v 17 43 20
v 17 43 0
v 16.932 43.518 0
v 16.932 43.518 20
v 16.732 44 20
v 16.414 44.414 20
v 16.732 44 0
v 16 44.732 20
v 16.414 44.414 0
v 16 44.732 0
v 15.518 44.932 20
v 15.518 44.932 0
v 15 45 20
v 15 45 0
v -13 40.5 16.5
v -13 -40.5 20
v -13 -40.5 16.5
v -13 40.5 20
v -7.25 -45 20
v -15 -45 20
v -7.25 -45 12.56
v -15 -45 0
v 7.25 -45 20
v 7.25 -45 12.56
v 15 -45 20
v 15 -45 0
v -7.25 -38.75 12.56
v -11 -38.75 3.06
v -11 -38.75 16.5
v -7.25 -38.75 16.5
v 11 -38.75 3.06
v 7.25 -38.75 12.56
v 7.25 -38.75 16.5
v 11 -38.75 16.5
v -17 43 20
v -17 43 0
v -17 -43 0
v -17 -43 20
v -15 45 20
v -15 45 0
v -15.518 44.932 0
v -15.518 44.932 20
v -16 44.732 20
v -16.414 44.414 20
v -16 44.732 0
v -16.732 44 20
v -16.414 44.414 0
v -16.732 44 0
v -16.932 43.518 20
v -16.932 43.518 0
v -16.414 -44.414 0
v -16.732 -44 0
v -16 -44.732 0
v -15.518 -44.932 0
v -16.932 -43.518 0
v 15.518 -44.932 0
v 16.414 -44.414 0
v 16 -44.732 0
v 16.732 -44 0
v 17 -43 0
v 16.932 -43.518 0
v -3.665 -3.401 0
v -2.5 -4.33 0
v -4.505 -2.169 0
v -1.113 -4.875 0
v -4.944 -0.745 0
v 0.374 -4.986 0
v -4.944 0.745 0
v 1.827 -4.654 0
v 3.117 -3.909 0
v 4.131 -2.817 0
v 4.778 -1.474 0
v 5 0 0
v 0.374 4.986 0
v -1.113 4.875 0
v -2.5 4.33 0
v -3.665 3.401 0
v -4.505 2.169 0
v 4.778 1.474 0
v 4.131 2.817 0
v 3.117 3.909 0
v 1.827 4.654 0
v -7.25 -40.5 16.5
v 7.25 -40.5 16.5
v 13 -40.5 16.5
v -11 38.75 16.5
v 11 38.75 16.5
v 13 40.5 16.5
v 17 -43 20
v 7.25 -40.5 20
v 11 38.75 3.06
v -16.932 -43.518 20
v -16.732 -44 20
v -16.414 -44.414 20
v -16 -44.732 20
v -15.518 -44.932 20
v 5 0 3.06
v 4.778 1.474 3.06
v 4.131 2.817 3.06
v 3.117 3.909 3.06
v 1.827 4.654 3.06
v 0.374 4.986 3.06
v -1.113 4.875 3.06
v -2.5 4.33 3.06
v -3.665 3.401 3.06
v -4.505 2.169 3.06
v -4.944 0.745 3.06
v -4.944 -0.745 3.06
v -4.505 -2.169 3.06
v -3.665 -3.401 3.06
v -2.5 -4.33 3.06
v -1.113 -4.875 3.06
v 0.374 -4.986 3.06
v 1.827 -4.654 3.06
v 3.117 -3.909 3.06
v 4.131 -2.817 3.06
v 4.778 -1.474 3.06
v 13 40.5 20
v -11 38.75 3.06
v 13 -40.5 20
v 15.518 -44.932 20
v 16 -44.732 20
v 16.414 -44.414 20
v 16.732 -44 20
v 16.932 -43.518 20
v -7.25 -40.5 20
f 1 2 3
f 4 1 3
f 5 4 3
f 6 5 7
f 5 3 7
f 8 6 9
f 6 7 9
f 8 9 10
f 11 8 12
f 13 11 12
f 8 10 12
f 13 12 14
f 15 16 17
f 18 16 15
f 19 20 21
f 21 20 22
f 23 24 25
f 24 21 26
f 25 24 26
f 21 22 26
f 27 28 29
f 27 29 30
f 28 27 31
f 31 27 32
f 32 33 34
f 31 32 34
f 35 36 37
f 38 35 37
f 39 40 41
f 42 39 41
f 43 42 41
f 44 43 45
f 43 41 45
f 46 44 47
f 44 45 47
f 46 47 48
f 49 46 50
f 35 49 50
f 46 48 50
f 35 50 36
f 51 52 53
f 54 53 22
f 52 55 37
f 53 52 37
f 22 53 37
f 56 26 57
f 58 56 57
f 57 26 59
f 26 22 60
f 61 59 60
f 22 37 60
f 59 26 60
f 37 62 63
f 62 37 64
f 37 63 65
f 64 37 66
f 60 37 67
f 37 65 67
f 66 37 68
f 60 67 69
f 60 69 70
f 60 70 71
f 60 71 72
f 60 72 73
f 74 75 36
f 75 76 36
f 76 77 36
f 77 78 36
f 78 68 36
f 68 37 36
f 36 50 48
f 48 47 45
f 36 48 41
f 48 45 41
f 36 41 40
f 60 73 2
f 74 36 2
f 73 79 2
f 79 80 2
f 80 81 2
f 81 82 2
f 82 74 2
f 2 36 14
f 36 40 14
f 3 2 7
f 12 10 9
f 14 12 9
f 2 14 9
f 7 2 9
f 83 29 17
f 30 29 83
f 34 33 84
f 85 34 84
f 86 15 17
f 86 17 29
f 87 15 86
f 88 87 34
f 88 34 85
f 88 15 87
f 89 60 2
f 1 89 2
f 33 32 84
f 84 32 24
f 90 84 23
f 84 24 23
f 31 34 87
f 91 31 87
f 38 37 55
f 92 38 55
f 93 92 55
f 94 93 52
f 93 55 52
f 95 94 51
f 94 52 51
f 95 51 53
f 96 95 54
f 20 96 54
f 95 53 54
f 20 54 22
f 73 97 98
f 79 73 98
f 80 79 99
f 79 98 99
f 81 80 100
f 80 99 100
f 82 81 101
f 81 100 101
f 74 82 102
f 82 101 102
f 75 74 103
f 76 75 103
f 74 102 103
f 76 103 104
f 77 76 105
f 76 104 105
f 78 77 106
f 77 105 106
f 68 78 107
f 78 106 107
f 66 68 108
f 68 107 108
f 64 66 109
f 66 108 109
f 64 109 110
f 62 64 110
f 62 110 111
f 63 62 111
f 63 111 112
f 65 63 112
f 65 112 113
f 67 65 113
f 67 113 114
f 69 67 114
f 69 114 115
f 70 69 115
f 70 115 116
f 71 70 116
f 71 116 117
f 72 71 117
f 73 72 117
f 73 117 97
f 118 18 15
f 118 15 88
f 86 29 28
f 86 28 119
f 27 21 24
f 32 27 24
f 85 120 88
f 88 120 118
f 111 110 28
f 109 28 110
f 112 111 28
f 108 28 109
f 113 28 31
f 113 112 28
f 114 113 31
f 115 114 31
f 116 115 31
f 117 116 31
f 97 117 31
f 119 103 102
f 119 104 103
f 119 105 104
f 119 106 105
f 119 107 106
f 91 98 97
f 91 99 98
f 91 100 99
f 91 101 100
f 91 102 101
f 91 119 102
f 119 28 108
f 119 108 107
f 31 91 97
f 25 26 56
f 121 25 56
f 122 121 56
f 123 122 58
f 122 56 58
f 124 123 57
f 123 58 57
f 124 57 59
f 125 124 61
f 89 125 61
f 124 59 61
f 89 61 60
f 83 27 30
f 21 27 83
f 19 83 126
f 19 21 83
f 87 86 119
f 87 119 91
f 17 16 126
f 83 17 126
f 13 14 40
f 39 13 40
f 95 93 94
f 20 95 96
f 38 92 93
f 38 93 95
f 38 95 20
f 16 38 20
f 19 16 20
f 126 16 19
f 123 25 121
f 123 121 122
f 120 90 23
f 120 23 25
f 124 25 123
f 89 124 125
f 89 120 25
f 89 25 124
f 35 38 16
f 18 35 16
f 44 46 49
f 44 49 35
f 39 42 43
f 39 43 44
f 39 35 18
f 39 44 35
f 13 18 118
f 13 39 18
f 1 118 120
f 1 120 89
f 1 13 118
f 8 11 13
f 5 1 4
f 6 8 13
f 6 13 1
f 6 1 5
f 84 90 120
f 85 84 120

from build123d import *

# Parameters (mm, degrees)
PAD_DEPTH       = 20
SKETCH001_W     = 26
SKETCH001_H     = 81
POCKET_DEPTH    = 3.5
SKETCH002_W     = 22
SKETCH002_H     = 77.5
POCKET001_DEPTH = 13.44
SKETCH003_W     = 14.5
SKETCH003_H     = 7.44
POCKET002_DEPTH = 45
SKETCH004_R     = 5
POCKET003_DEPTH = 3.061


with BuildPart() as part:
    # Sketch → Pad (new body)
    with BuildSketch(Plane.XY):
        with BuildLine():
            Line((-17, 43), (-17, -43))
            ThreePointArc((-17, -43), (-16.414214, -44.414214), (-15, -45))
            Line((-15, -45), (15, -45))
            ThreePointArc((15, -45), (16.414214, -44.414214), (17, -43))
            Line((17, -43), (17, 43))
            ThreePointArc((17, 43), (16.414214, 44.414214), (15, 45))
            Line((15, 45), (-15, 45))
            ThreePointArc((-15, 45), (-16.414214, 44.414214), (-17, 43))
        make_face()
    extrude(amount=PAD_DEPTH)

    # Sketch001 (on Face10 of Pad) → Pocket (cut)
    with BuildSketch(Plane.XY.offset(20)):
        Rectangle(SKETCH001_W, SKETCH001_H)
    extrude(amount=-POCKET_DEPTH, mode=Mode.SUBTRACT)

    # Sketch002 (on Face15 of Pocket) → Pocket001 (cut)
    with BuildSketch(Plane.XY.offset(16.5)):
        Rectangle(SKETCH002_W, SKETCH002_H)
    extrude(amount=-POCKET001_DEPTH, mode=Mode.SUBTRACT)

    # Sketch003 (on Face7 of Pocket001) → Pocket002 (cut)
    with BuildSketch(Plane.XZ.offset(45)):
        with Locations((0, 16.28)):
            Rectangle(SKETCH003_W, SKETCH003_H)
    extrude(amount=-POCKET002_DEPTH, mode=Mode.SUBTRACT)

    # Sketch004 (on Face24 of Pocket002) → Pocket003 (cut, through all)
    with BuildSketch(Plane.XY.offset(3.06)):
        Circle(SKETCH004_R)
    extrude(amount=-POCKET003_DEPTH, mode=Mode.SUBTRACT)


solid = part.part
